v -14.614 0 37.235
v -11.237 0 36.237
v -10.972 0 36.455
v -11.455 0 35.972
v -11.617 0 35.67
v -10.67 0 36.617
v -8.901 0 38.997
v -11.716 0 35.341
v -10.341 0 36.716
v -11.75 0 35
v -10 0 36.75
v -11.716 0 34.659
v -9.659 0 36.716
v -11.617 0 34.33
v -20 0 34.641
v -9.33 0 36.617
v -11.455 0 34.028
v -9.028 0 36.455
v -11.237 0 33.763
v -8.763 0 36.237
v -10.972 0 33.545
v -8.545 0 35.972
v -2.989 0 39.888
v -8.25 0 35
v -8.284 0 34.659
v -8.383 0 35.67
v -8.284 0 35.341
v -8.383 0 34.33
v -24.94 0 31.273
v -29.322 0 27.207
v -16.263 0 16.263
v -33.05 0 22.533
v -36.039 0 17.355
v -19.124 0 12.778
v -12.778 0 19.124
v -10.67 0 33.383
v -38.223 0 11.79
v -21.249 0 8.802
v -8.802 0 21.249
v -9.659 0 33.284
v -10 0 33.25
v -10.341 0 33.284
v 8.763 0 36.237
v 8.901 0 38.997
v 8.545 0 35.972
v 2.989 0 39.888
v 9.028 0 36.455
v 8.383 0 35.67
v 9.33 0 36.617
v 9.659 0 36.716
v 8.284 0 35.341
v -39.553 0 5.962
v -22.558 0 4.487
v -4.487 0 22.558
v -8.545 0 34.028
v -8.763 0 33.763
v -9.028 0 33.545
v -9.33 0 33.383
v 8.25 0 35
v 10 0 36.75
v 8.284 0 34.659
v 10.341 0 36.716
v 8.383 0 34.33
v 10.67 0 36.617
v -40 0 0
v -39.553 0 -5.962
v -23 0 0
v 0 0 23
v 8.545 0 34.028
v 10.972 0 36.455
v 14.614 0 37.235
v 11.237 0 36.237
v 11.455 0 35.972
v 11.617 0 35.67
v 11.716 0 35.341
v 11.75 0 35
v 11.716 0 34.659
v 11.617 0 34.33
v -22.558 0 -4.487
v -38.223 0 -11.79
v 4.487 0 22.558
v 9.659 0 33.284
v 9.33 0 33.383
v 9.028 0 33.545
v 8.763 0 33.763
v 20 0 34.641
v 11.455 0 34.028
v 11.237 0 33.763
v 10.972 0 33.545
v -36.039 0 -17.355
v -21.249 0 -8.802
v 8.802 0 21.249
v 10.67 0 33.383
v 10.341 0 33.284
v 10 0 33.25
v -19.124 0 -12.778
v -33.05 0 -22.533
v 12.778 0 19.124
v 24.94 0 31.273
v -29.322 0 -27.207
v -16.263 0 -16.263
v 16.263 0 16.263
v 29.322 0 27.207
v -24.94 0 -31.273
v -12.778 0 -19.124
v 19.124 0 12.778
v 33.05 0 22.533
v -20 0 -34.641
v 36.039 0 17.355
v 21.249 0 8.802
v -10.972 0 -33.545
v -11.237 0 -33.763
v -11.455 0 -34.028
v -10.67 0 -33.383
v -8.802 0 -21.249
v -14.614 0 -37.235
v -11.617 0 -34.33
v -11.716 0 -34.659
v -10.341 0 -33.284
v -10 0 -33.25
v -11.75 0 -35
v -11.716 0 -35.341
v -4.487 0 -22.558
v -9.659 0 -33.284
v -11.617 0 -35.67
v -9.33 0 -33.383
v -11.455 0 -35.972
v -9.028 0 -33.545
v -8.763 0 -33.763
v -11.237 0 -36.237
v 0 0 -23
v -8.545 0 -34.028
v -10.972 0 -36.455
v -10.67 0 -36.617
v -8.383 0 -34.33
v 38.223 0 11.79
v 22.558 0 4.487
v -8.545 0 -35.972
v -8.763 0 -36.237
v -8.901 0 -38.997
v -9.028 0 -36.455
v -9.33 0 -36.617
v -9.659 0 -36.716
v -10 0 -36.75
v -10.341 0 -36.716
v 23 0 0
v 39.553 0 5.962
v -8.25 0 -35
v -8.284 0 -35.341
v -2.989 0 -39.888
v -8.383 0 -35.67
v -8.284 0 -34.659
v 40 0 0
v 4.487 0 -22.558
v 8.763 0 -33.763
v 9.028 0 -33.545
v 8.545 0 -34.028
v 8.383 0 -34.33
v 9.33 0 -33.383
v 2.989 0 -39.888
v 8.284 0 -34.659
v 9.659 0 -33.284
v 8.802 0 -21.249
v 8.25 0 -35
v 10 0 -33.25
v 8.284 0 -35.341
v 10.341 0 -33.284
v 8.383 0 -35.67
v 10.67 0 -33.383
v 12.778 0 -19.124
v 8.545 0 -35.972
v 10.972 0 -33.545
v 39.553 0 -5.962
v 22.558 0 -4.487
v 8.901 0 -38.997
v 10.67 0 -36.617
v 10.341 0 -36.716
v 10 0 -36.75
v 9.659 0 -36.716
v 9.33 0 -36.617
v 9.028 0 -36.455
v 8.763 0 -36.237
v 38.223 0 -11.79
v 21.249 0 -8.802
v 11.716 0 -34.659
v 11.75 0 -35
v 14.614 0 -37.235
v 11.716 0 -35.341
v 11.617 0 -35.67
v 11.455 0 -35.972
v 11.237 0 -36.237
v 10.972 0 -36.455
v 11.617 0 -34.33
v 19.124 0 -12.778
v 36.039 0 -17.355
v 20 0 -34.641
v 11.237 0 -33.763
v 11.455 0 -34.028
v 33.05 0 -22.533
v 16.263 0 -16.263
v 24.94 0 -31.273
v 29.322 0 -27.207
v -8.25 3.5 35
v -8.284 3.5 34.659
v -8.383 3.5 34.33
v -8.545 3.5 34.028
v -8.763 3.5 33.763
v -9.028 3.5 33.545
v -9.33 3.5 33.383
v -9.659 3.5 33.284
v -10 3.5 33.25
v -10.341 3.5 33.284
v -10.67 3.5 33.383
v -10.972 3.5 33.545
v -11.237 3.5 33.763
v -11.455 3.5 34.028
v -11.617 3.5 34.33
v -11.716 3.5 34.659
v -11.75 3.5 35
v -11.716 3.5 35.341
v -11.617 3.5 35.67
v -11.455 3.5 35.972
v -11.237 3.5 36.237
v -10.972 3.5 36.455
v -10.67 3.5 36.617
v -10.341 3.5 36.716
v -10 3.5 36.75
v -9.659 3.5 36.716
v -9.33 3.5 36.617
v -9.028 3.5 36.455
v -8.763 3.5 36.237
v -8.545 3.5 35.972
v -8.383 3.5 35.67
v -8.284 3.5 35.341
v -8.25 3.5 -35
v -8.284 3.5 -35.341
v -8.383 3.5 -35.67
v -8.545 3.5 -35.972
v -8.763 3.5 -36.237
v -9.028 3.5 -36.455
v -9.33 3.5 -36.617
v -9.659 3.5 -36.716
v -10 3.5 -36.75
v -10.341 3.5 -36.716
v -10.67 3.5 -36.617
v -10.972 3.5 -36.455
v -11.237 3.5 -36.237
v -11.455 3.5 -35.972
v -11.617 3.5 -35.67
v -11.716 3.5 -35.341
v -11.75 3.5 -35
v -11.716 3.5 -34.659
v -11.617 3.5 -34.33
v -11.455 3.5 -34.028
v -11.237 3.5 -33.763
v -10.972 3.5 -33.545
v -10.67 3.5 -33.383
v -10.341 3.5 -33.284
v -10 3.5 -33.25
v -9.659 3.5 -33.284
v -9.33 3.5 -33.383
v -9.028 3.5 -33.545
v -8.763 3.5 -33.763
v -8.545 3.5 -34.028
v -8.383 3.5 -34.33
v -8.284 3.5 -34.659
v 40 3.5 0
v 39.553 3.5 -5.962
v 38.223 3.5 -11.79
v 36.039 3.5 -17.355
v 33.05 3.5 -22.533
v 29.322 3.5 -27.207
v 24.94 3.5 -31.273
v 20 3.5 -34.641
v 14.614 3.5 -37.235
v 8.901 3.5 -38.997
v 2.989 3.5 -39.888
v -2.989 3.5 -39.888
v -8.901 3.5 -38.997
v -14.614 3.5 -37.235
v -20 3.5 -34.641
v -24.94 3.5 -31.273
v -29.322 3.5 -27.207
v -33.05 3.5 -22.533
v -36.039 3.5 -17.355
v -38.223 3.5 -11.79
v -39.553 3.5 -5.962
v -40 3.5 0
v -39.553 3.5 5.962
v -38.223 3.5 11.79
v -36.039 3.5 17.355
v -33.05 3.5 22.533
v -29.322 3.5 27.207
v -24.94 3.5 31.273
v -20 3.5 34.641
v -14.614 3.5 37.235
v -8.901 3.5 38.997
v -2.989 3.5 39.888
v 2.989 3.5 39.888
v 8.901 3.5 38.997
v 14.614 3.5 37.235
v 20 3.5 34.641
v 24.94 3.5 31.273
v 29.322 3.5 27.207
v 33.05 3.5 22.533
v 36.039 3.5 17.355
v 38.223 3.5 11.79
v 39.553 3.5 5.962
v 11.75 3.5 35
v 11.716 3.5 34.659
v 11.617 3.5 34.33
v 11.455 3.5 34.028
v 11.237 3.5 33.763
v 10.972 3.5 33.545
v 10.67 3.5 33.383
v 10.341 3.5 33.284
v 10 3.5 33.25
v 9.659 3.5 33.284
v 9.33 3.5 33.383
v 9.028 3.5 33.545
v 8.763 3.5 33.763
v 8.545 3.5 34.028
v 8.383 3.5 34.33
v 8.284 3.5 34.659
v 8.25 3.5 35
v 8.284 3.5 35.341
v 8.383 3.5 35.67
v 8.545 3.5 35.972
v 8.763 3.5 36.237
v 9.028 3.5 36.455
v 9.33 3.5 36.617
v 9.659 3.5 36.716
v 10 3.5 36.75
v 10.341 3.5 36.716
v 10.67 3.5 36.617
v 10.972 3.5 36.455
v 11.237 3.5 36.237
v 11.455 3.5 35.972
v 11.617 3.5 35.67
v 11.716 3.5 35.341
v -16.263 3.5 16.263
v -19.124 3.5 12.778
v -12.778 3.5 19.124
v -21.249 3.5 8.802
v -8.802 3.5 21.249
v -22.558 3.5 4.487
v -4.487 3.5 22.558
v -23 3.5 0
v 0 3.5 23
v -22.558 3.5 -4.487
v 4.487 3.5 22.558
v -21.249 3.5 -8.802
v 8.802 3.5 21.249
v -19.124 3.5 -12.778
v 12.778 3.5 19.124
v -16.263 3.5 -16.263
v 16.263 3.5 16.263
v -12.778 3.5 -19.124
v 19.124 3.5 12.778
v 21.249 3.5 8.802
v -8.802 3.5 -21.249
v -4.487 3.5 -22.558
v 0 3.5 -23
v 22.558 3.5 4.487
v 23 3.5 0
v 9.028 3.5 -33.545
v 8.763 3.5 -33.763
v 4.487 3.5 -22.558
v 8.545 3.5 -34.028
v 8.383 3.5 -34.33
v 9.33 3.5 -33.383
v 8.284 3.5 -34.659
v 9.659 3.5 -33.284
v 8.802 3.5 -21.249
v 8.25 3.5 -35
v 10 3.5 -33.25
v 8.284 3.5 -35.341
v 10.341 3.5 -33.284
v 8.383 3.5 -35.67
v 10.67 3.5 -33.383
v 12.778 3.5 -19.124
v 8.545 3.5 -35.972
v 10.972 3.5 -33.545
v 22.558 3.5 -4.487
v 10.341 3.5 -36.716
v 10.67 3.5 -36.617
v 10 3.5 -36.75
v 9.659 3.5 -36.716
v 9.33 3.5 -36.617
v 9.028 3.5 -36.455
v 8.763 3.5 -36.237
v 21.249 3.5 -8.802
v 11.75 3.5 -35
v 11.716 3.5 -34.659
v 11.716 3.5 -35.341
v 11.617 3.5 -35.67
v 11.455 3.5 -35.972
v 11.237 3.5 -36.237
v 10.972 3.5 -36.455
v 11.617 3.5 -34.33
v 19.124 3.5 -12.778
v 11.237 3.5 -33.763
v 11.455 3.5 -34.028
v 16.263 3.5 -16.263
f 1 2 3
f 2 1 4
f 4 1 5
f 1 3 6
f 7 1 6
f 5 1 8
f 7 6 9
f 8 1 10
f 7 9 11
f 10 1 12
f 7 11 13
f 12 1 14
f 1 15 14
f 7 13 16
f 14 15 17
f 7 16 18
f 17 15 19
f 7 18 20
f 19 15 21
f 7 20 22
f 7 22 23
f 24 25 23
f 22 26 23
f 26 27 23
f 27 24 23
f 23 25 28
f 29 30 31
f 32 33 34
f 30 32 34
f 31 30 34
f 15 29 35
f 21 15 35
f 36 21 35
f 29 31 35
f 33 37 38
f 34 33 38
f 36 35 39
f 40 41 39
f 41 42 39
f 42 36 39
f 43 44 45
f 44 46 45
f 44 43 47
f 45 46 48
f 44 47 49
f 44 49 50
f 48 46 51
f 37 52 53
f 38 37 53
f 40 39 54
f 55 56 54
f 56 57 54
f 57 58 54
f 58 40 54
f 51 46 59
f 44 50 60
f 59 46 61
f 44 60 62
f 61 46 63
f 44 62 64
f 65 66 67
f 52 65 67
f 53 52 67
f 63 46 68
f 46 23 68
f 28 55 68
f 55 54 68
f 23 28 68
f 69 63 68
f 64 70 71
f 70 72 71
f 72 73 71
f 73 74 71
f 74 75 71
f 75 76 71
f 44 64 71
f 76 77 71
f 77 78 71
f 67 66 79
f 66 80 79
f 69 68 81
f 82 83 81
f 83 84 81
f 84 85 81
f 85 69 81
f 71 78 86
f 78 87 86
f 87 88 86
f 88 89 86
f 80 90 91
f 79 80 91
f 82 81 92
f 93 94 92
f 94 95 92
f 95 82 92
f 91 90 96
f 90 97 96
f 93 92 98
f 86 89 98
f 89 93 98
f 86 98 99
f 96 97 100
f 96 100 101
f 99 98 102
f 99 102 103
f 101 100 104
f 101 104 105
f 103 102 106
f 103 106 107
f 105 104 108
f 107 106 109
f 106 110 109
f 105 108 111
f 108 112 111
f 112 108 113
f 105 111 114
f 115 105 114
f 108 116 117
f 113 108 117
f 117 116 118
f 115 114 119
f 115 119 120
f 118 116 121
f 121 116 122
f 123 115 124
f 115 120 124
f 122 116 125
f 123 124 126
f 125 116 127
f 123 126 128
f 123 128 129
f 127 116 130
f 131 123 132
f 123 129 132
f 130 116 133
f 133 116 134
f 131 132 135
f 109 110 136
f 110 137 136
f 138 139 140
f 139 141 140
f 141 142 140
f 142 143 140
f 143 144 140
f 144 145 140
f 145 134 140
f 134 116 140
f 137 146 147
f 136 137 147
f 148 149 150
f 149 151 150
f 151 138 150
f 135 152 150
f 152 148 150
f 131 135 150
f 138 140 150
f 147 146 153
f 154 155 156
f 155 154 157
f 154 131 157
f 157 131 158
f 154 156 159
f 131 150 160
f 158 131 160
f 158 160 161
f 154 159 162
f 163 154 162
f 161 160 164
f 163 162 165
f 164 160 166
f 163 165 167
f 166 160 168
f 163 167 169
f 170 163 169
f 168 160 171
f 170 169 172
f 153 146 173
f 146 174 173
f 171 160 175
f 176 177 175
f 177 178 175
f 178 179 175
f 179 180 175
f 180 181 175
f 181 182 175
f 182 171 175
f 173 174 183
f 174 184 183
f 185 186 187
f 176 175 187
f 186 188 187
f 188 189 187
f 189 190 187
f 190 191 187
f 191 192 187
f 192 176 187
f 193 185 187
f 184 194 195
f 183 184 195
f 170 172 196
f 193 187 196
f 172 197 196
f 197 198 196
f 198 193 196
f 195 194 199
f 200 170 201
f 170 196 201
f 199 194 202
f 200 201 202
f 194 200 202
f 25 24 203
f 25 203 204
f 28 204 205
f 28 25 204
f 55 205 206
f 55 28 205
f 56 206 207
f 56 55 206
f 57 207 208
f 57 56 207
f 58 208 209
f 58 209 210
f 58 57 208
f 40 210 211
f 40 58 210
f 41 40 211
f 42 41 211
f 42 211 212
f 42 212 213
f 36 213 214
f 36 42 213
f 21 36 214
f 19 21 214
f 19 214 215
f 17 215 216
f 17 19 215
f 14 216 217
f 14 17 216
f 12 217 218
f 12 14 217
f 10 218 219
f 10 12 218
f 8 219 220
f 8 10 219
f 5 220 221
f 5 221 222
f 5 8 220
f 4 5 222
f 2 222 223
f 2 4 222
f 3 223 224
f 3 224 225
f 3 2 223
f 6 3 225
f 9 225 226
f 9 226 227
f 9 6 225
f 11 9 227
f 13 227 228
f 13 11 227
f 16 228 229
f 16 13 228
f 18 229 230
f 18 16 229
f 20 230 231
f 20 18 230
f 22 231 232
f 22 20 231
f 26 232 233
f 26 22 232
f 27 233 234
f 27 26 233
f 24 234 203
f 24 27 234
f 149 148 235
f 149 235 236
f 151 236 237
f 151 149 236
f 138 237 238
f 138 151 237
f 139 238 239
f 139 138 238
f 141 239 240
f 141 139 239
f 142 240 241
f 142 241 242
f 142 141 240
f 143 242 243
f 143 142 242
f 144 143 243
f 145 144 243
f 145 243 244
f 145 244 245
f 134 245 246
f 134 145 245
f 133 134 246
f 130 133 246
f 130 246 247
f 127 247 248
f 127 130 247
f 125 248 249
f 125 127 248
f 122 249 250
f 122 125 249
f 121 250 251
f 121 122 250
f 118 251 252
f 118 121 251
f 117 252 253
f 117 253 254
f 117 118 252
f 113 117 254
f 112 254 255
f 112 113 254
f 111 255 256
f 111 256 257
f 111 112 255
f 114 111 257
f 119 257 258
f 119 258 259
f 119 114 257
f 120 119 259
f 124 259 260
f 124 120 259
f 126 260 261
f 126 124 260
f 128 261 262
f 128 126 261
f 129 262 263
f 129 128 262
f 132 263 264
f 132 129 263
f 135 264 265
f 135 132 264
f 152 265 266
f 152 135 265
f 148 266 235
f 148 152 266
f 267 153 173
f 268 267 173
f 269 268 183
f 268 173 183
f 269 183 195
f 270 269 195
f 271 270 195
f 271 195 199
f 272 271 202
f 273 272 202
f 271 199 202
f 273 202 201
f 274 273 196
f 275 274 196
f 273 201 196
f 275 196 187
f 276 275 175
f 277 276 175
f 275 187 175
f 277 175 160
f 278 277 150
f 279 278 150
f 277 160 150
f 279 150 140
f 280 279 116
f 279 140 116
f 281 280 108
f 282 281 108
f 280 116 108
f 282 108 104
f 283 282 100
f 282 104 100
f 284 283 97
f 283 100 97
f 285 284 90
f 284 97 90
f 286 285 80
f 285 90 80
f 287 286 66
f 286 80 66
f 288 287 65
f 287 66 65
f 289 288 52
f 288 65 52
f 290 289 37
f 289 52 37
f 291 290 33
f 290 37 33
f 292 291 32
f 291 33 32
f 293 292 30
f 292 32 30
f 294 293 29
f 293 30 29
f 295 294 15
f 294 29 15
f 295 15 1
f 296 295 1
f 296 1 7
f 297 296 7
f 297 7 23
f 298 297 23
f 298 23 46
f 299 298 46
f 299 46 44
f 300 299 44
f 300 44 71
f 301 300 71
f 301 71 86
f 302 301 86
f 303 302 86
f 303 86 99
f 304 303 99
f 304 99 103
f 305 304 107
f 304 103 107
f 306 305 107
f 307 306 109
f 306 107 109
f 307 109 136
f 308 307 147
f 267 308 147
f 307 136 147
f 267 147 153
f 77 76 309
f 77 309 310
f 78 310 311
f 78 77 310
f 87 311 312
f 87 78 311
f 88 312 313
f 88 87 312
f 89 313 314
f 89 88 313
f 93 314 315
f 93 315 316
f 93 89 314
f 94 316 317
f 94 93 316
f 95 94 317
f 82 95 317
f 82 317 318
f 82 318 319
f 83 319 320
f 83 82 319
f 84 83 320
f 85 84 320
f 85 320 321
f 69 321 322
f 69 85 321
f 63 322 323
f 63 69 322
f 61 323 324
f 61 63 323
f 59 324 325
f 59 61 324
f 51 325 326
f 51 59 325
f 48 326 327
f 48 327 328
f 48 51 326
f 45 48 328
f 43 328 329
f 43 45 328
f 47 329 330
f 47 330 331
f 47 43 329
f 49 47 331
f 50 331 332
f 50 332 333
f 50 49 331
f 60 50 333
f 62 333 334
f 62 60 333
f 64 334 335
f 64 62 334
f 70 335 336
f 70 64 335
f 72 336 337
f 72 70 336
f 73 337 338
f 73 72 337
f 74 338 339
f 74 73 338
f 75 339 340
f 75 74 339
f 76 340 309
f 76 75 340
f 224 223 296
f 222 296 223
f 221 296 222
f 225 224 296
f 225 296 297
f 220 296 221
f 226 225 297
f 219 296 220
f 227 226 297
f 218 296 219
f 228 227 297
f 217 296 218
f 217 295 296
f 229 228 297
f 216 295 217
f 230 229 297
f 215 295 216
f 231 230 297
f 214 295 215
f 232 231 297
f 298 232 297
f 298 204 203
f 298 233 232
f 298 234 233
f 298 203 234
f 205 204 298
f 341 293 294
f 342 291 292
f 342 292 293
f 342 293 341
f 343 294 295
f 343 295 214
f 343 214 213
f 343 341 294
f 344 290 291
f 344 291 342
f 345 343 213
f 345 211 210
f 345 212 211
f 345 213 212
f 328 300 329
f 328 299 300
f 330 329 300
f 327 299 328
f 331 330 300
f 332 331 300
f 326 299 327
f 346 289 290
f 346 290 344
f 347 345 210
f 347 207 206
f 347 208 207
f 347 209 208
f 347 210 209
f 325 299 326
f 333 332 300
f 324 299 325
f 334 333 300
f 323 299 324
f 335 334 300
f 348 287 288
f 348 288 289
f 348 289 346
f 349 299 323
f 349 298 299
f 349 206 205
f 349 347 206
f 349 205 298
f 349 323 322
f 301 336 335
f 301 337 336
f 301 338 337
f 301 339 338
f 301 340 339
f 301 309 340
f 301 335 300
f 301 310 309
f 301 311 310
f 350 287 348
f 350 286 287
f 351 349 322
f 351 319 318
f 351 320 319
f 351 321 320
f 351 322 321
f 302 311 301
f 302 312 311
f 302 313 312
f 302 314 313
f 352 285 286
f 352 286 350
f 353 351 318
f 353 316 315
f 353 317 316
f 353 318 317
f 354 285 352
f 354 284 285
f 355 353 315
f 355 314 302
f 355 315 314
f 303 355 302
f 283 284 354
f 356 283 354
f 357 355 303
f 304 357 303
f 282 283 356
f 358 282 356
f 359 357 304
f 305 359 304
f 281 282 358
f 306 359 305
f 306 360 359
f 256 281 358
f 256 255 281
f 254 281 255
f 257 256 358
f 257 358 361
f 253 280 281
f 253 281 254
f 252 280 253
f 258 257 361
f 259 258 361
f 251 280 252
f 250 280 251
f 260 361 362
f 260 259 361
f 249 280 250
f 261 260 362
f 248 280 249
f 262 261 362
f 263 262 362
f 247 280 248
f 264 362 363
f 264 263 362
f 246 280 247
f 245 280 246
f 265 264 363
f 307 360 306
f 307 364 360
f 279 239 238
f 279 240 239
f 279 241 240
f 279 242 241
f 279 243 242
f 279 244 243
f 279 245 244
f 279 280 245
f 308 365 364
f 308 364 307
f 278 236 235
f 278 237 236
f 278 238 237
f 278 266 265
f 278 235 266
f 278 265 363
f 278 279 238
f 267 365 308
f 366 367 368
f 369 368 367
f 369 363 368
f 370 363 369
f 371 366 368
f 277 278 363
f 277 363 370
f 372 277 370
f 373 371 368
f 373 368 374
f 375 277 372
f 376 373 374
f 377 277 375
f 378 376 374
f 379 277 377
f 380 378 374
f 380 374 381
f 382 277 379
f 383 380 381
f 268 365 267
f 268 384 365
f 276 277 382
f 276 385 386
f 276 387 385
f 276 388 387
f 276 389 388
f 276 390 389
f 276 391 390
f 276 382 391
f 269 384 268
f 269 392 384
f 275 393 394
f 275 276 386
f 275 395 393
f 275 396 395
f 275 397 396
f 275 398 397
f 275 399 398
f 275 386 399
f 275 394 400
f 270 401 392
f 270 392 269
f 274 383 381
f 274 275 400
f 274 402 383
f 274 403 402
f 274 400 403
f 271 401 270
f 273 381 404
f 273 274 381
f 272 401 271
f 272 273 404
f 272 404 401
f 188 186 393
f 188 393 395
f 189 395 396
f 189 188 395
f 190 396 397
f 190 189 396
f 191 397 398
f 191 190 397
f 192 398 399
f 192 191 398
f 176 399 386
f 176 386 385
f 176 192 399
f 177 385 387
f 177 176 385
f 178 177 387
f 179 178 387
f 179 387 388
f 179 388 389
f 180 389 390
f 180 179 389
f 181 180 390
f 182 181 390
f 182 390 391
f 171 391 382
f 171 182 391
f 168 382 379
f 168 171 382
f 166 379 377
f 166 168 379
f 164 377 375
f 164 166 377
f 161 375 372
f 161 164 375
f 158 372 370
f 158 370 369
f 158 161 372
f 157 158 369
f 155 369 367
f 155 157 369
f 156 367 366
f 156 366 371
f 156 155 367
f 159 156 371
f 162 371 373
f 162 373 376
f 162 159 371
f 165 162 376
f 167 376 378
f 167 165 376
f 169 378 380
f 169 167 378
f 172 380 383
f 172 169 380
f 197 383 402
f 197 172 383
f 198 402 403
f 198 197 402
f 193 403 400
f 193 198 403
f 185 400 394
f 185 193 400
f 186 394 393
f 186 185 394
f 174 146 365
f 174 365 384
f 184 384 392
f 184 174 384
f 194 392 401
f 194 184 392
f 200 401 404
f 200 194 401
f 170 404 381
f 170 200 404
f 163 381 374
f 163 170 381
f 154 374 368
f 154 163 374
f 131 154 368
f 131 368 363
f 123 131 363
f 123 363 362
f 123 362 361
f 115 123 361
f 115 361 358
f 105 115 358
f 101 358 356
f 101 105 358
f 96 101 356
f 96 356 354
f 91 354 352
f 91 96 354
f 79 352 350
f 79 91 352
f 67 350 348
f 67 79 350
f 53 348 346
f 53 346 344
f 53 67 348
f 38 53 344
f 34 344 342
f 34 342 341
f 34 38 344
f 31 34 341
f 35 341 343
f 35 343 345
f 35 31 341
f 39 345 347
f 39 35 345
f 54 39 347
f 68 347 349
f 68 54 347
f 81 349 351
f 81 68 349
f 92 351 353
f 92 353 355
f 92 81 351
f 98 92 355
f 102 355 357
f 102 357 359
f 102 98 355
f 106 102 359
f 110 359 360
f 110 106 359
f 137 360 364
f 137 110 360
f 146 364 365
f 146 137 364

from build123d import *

# Parameters (mm, degrees)
SKETCH1_R           = 40
SKETCH1_R_2         = 1.75
SKETCH1_R_3         = 23
BOSS_EXTRUDE1_DEPTH = 3.5


with BuildPart() as part:
    # Sketch1 → Boss-Extrude1 (new body)
    with BuildSketch(Plane(origin=(0, 0, 0), x_dir=(1, 0, 0), z_dir=(0, 1, 0))):
        Circle(SKETCH1_R)
        with Locations((10, 35)):
            Circle(SKETCH1_R_2, mode=Mode.SUBTRACT)
        with Locations((-10, 35)):
            Circle(SKETCH1_R_2, mode=Mode.SUBTRACT)
        with Locations((10, -35)):
            Circle(SKETCH1_R_2, mode=Mode.SUBTRACT)
        with Locations((-10, -35)):
            Circle(SKETCH1_R_2, mode=Mode.SUBTRACT)
        Circle(SKETCH1_R_3, mode=Mode.SUBTRACT)
    extrude(amount=BOSS_EXTRUDE1_DEPTH)


solid = part.part
